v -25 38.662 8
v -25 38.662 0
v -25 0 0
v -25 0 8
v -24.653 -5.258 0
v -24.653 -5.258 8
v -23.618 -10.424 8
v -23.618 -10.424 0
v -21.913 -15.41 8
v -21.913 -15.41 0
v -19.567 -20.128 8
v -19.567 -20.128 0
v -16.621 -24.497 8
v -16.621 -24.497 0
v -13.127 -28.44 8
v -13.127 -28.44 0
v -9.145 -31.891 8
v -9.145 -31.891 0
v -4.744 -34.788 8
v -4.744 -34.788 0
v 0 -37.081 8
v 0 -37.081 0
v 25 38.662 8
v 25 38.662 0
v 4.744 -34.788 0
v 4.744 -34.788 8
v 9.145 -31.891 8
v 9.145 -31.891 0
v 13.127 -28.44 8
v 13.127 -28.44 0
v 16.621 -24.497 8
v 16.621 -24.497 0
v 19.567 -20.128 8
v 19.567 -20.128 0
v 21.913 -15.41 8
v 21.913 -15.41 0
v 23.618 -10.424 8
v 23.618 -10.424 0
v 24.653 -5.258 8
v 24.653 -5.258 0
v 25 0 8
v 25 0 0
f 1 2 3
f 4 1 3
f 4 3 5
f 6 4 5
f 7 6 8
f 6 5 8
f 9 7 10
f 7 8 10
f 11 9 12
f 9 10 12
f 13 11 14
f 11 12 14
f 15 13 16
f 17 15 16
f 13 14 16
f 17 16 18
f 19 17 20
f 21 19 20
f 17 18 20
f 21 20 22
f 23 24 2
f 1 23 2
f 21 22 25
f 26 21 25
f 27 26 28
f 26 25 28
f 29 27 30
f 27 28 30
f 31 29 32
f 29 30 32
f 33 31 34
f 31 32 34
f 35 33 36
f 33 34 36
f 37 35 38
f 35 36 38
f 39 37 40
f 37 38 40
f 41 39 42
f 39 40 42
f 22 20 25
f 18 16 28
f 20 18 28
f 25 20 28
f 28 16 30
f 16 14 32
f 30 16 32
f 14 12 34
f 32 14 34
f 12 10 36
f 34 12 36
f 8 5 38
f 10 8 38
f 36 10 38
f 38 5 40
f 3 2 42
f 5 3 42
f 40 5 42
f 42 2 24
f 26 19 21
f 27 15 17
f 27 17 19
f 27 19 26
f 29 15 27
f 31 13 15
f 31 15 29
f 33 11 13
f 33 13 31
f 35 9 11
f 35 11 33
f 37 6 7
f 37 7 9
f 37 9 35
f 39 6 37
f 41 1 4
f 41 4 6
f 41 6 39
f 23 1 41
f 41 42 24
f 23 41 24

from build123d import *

# Parameters (mm, degrees)
F1_DEPTH = 8


with BuildPart() as f1:
    # F0 (on Top) → F1 (new body)
    with BuildSketch(Plane.XY):
        with BuildLine():
            Line((25, 38.661759), (-25, 38.661759))
            Line((-25, 38.661759), (-25, 0))
            ThreePointArc((-25, 0), (-18.166248, -22.36068), (0, -37.080992))
            ThreePointArc((0, -37.080992), (18.166248, -22.36068), (25, 0))
            Line((25, 0), (25, 38.661759))
        make_face()
    extrude(amount=F1_DEPTH)


solid = f1.part
